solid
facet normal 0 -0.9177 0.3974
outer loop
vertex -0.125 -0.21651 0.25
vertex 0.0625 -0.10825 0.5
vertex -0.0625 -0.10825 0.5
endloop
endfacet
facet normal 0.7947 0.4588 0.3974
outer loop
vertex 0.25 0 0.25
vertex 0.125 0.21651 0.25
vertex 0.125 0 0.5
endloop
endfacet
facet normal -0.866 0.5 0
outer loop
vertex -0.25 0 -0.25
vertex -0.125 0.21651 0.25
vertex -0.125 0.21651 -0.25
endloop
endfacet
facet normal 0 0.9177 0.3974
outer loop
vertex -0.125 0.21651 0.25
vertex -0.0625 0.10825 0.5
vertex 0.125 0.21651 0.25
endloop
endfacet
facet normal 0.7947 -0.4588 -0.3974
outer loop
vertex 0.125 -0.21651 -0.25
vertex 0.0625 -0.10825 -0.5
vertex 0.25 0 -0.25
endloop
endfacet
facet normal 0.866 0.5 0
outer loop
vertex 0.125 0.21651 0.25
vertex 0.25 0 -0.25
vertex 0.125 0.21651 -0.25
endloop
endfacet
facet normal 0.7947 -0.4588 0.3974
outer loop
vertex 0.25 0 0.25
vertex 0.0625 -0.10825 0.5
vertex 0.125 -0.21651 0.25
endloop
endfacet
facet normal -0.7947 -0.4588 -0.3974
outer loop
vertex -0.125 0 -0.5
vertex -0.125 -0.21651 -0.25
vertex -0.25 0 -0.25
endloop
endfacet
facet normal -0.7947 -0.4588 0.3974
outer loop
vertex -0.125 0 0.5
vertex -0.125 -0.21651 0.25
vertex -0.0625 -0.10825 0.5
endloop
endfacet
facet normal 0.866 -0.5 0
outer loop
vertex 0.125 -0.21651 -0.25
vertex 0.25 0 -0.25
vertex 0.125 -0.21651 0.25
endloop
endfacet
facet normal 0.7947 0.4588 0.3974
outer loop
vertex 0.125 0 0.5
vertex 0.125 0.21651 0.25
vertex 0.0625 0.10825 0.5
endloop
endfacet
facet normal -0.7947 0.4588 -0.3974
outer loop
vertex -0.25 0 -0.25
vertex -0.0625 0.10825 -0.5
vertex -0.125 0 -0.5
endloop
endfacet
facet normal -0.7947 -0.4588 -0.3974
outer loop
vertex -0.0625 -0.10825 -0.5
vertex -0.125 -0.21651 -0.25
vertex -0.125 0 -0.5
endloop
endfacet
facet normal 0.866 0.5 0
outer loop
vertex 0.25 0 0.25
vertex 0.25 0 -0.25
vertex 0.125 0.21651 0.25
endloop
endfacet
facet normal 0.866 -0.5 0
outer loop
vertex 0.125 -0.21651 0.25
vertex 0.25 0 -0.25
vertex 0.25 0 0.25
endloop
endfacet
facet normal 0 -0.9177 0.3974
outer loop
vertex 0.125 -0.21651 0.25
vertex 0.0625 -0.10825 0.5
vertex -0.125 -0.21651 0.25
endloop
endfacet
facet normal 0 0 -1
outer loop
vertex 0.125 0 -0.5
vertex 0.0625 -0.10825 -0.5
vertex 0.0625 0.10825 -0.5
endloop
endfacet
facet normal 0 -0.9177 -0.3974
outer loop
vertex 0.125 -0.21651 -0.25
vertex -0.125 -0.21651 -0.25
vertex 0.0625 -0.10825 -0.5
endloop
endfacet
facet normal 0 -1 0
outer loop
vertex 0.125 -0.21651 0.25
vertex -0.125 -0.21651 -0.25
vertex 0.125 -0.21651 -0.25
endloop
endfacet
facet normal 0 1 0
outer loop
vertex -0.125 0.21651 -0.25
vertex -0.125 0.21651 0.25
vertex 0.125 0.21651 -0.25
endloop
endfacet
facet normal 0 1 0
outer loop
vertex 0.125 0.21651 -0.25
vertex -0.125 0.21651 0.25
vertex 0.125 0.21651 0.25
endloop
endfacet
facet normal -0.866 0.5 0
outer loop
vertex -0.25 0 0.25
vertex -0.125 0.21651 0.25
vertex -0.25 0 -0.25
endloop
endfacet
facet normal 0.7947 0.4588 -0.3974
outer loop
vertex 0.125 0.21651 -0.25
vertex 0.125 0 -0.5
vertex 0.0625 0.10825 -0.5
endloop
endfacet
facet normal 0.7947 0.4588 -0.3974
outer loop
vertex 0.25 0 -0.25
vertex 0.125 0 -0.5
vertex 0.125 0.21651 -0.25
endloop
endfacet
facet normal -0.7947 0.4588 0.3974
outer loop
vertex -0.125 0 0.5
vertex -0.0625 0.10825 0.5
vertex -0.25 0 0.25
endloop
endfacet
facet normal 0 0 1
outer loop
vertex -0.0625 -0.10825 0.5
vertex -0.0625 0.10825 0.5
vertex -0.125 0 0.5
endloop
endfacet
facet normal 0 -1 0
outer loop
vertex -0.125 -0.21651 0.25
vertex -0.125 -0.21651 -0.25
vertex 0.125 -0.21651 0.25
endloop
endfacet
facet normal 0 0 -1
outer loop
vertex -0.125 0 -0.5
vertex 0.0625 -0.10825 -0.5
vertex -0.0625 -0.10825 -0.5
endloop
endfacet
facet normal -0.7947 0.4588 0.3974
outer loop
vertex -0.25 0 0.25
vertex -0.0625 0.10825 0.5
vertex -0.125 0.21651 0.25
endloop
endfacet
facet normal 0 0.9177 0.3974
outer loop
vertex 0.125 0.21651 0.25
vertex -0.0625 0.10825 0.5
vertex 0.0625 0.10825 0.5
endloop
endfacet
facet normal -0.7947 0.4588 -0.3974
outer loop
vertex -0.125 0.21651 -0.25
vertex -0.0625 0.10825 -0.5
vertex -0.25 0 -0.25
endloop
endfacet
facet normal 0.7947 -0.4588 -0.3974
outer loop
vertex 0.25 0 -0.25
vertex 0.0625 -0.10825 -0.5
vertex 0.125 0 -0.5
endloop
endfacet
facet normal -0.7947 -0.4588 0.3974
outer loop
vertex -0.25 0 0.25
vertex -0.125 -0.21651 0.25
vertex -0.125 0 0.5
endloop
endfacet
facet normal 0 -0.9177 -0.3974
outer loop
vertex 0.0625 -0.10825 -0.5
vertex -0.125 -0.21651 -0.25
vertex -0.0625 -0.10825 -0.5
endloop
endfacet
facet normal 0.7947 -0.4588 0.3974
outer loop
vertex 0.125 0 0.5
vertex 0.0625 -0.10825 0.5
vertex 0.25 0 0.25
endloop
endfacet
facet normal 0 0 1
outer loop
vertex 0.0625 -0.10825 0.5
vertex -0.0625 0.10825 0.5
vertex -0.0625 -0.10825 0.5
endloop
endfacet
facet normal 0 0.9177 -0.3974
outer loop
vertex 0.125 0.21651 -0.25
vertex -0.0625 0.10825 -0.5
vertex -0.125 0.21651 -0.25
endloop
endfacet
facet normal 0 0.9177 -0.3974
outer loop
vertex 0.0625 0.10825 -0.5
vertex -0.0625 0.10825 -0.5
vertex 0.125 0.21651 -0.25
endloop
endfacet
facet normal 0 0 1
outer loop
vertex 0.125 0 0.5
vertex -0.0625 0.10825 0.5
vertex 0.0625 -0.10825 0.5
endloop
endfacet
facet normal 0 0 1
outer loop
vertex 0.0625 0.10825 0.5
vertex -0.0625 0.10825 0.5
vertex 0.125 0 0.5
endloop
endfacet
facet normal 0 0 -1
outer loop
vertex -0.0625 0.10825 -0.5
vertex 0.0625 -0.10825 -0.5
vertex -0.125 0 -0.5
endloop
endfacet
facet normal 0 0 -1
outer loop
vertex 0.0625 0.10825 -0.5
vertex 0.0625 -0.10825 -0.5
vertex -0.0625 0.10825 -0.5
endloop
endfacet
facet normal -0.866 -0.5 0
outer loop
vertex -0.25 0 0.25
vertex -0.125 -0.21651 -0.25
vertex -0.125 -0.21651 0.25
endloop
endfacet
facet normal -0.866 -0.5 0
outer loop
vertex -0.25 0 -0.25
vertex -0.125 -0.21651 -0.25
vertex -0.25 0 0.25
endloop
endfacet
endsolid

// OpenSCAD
sc = .6;

minkowski(){
    linear_extrude(height=3){
        scale([sc,sc,sc]) import("novalabs_ppe_circular.dxf");
    }
    
    hull(){
        cylinder(r=.125, h=1, $fn=6, center=true);
        cylinder(r=.25, h=.5, $fn=6, center=true);
    }
}
